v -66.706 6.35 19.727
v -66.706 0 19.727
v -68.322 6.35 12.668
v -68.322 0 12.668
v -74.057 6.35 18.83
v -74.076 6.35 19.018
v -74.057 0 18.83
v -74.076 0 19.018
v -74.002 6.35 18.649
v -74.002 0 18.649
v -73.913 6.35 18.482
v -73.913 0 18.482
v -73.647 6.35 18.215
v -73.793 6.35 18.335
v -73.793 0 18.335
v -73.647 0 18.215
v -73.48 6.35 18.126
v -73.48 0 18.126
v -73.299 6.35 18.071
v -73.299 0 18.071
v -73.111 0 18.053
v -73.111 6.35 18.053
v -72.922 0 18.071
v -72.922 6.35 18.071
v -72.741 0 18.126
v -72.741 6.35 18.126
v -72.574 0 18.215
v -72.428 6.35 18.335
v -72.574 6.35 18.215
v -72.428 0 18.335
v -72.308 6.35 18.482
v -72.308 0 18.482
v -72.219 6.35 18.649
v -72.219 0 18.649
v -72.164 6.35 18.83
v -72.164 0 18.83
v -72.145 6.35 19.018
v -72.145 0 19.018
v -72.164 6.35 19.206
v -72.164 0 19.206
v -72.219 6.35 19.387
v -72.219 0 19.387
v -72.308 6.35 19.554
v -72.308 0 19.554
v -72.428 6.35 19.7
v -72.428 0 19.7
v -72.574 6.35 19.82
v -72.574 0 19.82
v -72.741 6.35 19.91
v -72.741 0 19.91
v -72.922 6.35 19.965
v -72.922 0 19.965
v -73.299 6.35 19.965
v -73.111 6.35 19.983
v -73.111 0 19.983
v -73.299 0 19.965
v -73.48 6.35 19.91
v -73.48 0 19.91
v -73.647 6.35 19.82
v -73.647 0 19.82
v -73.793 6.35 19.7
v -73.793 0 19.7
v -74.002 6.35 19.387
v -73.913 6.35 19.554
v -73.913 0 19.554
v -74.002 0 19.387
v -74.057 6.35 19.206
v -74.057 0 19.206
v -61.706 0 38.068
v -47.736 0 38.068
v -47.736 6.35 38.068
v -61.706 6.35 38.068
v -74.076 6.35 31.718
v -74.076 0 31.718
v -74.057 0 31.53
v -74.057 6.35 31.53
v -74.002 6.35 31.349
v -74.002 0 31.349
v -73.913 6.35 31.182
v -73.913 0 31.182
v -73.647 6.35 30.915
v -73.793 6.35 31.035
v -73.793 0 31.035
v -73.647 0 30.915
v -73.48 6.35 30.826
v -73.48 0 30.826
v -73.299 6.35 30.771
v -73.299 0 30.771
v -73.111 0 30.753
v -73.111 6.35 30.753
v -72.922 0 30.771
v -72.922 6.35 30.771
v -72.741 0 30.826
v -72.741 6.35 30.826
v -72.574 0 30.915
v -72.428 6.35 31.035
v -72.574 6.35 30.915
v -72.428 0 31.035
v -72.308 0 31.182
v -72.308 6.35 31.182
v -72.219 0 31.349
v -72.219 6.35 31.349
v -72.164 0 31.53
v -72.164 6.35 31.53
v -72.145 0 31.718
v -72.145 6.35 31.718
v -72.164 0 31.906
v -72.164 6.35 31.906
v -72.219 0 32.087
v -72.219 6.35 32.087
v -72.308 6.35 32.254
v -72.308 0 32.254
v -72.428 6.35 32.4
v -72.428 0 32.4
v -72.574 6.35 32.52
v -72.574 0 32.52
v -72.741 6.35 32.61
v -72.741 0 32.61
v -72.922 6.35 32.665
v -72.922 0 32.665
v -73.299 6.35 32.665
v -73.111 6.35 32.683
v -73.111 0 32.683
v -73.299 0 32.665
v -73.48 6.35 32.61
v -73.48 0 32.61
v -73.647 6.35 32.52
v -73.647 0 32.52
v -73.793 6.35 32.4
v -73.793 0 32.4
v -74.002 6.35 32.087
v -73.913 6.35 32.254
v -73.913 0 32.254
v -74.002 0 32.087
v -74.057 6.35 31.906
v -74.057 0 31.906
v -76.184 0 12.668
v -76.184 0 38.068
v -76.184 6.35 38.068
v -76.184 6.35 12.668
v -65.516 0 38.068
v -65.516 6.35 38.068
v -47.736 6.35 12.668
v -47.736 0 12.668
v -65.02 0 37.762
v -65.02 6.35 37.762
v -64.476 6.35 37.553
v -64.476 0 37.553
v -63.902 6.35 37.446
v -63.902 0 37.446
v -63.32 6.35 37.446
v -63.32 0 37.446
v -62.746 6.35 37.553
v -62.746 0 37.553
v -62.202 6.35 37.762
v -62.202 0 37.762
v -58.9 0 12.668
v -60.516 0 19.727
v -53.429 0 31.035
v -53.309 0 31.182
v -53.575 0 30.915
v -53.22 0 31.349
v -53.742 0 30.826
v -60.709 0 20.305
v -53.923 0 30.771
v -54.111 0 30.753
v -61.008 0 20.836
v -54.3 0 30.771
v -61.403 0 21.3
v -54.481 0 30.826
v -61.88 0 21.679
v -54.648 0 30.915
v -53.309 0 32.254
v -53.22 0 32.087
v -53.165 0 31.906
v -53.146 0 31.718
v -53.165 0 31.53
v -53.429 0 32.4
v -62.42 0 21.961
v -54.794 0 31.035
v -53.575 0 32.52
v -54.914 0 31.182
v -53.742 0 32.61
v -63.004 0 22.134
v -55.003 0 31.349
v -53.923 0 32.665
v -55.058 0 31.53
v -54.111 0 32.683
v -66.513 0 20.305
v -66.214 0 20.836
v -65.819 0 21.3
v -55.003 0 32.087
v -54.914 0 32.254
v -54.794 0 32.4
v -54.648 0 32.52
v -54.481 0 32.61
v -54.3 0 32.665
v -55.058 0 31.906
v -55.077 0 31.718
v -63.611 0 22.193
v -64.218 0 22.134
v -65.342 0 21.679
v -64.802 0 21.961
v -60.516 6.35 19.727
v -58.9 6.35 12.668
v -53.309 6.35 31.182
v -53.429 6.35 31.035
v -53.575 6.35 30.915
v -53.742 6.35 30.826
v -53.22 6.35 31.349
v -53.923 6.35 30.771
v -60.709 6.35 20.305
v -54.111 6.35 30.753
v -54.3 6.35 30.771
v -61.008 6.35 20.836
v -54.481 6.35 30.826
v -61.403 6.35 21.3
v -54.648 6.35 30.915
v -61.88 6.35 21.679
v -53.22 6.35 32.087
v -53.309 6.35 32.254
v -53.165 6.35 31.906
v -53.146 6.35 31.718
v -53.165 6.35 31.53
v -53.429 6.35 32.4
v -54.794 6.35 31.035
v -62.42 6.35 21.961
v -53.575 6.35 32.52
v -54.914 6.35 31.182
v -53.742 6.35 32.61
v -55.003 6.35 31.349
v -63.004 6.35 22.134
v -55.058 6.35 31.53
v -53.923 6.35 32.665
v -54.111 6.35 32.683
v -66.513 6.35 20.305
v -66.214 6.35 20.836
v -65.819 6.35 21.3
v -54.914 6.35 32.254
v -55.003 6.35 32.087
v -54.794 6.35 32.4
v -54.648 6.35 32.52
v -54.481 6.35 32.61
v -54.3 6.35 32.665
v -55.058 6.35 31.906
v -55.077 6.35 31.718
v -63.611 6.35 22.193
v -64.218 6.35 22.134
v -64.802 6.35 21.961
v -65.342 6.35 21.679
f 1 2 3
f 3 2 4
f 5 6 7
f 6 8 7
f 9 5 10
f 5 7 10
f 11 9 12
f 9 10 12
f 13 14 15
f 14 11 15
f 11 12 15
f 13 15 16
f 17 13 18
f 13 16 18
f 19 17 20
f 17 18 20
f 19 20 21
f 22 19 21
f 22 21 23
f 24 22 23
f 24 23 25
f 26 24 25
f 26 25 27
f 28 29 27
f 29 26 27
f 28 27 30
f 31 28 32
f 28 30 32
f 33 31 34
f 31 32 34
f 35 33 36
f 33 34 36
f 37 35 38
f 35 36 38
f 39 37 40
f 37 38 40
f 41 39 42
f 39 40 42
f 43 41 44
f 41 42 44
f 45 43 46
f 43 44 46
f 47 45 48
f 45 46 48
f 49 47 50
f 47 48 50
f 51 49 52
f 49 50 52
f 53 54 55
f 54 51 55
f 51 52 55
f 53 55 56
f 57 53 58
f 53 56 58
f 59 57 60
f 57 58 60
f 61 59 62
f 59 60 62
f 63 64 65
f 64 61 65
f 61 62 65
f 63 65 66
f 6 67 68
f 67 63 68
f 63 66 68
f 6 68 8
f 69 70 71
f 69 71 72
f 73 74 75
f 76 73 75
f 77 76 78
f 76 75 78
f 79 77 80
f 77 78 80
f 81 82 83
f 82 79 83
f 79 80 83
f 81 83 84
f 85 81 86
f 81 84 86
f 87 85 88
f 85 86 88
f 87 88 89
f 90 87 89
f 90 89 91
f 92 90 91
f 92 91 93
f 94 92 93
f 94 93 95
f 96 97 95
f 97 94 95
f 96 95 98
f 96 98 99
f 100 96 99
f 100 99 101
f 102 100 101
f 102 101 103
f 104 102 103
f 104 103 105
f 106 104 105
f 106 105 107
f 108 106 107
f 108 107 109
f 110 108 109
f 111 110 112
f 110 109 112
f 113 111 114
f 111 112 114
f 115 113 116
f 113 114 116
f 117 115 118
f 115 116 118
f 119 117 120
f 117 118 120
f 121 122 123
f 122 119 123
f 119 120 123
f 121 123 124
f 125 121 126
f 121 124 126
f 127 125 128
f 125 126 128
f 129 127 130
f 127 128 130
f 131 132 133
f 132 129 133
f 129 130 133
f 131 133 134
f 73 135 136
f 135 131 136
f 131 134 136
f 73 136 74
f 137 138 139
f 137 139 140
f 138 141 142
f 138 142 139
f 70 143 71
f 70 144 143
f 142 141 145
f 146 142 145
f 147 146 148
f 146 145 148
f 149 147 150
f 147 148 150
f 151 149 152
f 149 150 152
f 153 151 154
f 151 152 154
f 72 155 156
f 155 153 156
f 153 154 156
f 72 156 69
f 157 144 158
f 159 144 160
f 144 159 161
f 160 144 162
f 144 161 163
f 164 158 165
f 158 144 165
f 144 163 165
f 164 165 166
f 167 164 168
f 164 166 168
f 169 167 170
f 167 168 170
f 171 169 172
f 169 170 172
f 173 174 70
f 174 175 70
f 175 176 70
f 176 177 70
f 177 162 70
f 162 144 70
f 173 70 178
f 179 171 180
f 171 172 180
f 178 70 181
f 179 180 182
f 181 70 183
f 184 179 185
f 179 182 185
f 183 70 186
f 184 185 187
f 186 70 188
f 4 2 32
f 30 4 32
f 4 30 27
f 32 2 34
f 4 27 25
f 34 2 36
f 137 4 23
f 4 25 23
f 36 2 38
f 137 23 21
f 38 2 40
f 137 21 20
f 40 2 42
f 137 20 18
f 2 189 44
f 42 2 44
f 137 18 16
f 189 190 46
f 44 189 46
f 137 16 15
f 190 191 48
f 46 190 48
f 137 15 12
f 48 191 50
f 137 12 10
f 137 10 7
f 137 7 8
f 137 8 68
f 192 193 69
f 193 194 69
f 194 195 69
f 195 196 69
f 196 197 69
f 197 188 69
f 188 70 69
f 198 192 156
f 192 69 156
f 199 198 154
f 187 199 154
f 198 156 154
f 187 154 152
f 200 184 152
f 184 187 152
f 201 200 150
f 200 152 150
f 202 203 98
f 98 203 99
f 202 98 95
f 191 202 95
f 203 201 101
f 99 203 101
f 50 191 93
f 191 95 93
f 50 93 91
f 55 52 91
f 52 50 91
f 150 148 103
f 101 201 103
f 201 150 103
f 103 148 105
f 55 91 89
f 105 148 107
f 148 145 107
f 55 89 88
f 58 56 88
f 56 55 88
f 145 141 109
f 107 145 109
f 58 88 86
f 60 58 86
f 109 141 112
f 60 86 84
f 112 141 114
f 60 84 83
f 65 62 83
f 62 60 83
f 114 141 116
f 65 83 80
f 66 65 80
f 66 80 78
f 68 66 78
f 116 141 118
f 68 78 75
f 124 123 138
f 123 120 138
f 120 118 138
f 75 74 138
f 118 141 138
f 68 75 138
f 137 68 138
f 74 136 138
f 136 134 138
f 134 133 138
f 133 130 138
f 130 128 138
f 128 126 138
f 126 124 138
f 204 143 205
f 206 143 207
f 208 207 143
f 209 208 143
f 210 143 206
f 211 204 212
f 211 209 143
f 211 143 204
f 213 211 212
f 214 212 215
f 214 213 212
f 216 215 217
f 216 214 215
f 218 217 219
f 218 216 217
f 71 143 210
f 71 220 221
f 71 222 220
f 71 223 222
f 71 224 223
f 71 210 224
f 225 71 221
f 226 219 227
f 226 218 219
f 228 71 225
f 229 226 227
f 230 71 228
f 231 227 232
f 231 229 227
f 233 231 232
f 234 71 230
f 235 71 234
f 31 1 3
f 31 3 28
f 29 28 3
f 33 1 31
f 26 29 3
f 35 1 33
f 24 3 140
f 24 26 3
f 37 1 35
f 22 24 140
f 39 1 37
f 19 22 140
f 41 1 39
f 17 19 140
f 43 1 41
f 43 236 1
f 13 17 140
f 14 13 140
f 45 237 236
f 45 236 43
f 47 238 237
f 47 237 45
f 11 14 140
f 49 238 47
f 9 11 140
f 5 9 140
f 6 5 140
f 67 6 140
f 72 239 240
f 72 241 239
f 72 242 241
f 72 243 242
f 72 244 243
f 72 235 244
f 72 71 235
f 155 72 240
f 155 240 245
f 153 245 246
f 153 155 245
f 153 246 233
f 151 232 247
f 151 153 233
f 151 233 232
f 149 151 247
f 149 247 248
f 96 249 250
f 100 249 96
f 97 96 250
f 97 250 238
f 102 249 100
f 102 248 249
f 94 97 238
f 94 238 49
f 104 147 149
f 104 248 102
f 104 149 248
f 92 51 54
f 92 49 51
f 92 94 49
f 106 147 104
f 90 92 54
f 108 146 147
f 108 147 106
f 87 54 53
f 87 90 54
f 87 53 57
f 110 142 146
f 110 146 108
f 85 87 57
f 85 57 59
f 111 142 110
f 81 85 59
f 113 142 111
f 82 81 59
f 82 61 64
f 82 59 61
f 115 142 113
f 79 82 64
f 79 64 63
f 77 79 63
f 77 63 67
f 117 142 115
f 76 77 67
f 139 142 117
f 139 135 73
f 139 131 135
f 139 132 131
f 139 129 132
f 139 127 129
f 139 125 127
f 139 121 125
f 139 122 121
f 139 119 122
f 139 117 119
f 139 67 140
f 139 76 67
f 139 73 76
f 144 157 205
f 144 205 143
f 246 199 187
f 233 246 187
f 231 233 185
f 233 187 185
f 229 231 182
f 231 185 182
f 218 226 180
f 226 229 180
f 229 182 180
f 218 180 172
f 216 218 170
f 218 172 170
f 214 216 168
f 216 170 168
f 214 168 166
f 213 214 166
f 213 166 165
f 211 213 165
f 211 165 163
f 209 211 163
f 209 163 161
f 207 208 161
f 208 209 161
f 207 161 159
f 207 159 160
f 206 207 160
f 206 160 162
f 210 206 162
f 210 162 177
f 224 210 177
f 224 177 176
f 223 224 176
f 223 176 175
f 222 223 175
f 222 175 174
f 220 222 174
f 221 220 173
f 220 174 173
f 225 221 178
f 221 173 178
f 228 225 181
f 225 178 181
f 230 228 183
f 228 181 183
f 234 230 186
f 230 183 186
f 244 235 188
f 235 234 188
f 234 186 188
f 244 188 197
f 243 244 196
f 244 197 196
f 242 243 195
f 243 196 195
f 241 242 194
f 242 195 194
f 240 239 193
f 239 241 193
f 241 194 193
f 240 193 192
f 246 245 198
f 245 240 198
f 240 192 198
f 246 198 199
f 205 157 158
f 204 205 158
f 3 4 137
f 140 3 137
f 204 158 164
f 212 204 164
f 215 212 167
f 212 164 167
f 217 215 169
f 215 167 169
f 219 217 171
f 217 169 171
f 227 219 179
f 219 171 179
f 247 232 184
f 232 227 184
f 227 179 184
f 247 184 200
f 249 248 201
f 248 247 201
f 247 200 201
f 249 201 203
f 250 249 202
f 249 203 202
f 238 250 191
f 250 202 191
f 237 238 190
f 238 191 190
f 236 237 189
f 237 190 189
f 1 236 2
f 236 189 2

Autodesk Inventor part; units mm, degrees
ref_plane "YZ Plane" through (0, 0, 0) normal (1, 0, 0) x (0, 1, 0)
ref_plane "XZ Plane" through (0, 0, 0) normal (0, 1, 0) x (-1, 0, 0)
ref_plane "XY Plane" through (0, 0, 0) normal (0, 0, 1) x (1, 0, 0)
sketch "Sketch1" plane through (0, 0, 0) normal (0, 1, 0) x (-1, 0, 0)
  circle A0 centre (73.1106, 19.0179) radius 0.9652
  circle A1 centre (73.1106, 31.7179) radius 0.9652
  circle A2 centre (54.1114, 31.7179) radius 0.9652
  line L0 (58.8995, 12.6679) -> (60.5161, 19.7267)
  arc A3 (66.7058, 19.7267) -> (60.5161, 19.7267) centre (63.611, 19.0179) ccw
  line L1 (66.7058, 19.7267) -> (68.3224, 12.6679)
  arc A4 (61.706, 38.0679) -> (65.516, 38.0679) centre (63.611, 40.6079) ccw
  line L2 (79.486, 38.0679) -> (79.486, 12.6679) construction
  line L3 (47.736, 12.6679) -> (47.736, 38.0679)
  line L4 (47.736, 38.0679) -> (61.706, 38.0679)
  line L5 (65.516, 38.0679) -> (79.486, 38.0679) construction
  line L6 (79.486, 12.6679) -> (68.3224, 12.6679) construction
  line L7 (58.8995, 12.6679) -> (47.736, 12.6679)
  line L8 (76.184, 38.0679) -> (76.184, 12.6679)
  line L9 (65.516, 38.0679) -> (76.184, 38.0679)
  line L10 (68.3224, 12.6679) -> (76.184, 12.6679)
  point P0 (0, 0)
  dimension "d9" = 1.9304
  dimension "d10" = 25.4
  dimension "d11" = 31.75
  dimension "d14" = 18.9992
  dimension "d15" = 6.3754
  dimension "d16" = 15.875
  dimension "d17" = 15.875
  dimension "d18" = 28.448
extrude "Extrusion1" add sketch "Sketch1" along normal blind 6.35
sketch "Sketch3" plane through (0, 0, 0) normal (0, -1, 0) x (1, 0, 0)
  arc A0 (-60.5161, 19.7267) -> (-66.7058, 19.7267) centre (-63.611, 19.0179) ccw projected
  line L0 (-58.8995, 12.6679) -> (-60.5161, 19.7267) projected
  line L1 (-47.736, 12.6679) -> (-58.8995, 12.6679) projected
  line L2 (-47.736, 38.0679) -> (-47.736, 12.6679) projected
  line L3 (-61.706, 38.0679) -> (-47.736, 38.0679) projected
  arc A1 (-65.516, 38.0679) -> (-61.706, 38.0679) centre (-63.611, 40.6079) ccw projected
  line L4 (-76.184, 38.0679) -> (-65.516, 38.0679) projected
  line L5 (-76.184, 12.6679) -> (-76.184, 38.0679) projected
  line L6 (-68.3224, 12.6679) -> (-76.184, 12.6679) projected
  line L7 (-66.7058, 19.7267) -> (-68.3224, 12.6679) projected
  circle A2 centre (-54.1114, 31.7179) radius 0.9652 projected
  circle A3 centre (-73.1106, 31.7179) radius 0.9652 projected
  circle A4 centre (-73.1106, 19.0179) radius 0.9652 projected
  point P0 (0, 0)
properties part number "delrin for sides" material "UHMW, White"
